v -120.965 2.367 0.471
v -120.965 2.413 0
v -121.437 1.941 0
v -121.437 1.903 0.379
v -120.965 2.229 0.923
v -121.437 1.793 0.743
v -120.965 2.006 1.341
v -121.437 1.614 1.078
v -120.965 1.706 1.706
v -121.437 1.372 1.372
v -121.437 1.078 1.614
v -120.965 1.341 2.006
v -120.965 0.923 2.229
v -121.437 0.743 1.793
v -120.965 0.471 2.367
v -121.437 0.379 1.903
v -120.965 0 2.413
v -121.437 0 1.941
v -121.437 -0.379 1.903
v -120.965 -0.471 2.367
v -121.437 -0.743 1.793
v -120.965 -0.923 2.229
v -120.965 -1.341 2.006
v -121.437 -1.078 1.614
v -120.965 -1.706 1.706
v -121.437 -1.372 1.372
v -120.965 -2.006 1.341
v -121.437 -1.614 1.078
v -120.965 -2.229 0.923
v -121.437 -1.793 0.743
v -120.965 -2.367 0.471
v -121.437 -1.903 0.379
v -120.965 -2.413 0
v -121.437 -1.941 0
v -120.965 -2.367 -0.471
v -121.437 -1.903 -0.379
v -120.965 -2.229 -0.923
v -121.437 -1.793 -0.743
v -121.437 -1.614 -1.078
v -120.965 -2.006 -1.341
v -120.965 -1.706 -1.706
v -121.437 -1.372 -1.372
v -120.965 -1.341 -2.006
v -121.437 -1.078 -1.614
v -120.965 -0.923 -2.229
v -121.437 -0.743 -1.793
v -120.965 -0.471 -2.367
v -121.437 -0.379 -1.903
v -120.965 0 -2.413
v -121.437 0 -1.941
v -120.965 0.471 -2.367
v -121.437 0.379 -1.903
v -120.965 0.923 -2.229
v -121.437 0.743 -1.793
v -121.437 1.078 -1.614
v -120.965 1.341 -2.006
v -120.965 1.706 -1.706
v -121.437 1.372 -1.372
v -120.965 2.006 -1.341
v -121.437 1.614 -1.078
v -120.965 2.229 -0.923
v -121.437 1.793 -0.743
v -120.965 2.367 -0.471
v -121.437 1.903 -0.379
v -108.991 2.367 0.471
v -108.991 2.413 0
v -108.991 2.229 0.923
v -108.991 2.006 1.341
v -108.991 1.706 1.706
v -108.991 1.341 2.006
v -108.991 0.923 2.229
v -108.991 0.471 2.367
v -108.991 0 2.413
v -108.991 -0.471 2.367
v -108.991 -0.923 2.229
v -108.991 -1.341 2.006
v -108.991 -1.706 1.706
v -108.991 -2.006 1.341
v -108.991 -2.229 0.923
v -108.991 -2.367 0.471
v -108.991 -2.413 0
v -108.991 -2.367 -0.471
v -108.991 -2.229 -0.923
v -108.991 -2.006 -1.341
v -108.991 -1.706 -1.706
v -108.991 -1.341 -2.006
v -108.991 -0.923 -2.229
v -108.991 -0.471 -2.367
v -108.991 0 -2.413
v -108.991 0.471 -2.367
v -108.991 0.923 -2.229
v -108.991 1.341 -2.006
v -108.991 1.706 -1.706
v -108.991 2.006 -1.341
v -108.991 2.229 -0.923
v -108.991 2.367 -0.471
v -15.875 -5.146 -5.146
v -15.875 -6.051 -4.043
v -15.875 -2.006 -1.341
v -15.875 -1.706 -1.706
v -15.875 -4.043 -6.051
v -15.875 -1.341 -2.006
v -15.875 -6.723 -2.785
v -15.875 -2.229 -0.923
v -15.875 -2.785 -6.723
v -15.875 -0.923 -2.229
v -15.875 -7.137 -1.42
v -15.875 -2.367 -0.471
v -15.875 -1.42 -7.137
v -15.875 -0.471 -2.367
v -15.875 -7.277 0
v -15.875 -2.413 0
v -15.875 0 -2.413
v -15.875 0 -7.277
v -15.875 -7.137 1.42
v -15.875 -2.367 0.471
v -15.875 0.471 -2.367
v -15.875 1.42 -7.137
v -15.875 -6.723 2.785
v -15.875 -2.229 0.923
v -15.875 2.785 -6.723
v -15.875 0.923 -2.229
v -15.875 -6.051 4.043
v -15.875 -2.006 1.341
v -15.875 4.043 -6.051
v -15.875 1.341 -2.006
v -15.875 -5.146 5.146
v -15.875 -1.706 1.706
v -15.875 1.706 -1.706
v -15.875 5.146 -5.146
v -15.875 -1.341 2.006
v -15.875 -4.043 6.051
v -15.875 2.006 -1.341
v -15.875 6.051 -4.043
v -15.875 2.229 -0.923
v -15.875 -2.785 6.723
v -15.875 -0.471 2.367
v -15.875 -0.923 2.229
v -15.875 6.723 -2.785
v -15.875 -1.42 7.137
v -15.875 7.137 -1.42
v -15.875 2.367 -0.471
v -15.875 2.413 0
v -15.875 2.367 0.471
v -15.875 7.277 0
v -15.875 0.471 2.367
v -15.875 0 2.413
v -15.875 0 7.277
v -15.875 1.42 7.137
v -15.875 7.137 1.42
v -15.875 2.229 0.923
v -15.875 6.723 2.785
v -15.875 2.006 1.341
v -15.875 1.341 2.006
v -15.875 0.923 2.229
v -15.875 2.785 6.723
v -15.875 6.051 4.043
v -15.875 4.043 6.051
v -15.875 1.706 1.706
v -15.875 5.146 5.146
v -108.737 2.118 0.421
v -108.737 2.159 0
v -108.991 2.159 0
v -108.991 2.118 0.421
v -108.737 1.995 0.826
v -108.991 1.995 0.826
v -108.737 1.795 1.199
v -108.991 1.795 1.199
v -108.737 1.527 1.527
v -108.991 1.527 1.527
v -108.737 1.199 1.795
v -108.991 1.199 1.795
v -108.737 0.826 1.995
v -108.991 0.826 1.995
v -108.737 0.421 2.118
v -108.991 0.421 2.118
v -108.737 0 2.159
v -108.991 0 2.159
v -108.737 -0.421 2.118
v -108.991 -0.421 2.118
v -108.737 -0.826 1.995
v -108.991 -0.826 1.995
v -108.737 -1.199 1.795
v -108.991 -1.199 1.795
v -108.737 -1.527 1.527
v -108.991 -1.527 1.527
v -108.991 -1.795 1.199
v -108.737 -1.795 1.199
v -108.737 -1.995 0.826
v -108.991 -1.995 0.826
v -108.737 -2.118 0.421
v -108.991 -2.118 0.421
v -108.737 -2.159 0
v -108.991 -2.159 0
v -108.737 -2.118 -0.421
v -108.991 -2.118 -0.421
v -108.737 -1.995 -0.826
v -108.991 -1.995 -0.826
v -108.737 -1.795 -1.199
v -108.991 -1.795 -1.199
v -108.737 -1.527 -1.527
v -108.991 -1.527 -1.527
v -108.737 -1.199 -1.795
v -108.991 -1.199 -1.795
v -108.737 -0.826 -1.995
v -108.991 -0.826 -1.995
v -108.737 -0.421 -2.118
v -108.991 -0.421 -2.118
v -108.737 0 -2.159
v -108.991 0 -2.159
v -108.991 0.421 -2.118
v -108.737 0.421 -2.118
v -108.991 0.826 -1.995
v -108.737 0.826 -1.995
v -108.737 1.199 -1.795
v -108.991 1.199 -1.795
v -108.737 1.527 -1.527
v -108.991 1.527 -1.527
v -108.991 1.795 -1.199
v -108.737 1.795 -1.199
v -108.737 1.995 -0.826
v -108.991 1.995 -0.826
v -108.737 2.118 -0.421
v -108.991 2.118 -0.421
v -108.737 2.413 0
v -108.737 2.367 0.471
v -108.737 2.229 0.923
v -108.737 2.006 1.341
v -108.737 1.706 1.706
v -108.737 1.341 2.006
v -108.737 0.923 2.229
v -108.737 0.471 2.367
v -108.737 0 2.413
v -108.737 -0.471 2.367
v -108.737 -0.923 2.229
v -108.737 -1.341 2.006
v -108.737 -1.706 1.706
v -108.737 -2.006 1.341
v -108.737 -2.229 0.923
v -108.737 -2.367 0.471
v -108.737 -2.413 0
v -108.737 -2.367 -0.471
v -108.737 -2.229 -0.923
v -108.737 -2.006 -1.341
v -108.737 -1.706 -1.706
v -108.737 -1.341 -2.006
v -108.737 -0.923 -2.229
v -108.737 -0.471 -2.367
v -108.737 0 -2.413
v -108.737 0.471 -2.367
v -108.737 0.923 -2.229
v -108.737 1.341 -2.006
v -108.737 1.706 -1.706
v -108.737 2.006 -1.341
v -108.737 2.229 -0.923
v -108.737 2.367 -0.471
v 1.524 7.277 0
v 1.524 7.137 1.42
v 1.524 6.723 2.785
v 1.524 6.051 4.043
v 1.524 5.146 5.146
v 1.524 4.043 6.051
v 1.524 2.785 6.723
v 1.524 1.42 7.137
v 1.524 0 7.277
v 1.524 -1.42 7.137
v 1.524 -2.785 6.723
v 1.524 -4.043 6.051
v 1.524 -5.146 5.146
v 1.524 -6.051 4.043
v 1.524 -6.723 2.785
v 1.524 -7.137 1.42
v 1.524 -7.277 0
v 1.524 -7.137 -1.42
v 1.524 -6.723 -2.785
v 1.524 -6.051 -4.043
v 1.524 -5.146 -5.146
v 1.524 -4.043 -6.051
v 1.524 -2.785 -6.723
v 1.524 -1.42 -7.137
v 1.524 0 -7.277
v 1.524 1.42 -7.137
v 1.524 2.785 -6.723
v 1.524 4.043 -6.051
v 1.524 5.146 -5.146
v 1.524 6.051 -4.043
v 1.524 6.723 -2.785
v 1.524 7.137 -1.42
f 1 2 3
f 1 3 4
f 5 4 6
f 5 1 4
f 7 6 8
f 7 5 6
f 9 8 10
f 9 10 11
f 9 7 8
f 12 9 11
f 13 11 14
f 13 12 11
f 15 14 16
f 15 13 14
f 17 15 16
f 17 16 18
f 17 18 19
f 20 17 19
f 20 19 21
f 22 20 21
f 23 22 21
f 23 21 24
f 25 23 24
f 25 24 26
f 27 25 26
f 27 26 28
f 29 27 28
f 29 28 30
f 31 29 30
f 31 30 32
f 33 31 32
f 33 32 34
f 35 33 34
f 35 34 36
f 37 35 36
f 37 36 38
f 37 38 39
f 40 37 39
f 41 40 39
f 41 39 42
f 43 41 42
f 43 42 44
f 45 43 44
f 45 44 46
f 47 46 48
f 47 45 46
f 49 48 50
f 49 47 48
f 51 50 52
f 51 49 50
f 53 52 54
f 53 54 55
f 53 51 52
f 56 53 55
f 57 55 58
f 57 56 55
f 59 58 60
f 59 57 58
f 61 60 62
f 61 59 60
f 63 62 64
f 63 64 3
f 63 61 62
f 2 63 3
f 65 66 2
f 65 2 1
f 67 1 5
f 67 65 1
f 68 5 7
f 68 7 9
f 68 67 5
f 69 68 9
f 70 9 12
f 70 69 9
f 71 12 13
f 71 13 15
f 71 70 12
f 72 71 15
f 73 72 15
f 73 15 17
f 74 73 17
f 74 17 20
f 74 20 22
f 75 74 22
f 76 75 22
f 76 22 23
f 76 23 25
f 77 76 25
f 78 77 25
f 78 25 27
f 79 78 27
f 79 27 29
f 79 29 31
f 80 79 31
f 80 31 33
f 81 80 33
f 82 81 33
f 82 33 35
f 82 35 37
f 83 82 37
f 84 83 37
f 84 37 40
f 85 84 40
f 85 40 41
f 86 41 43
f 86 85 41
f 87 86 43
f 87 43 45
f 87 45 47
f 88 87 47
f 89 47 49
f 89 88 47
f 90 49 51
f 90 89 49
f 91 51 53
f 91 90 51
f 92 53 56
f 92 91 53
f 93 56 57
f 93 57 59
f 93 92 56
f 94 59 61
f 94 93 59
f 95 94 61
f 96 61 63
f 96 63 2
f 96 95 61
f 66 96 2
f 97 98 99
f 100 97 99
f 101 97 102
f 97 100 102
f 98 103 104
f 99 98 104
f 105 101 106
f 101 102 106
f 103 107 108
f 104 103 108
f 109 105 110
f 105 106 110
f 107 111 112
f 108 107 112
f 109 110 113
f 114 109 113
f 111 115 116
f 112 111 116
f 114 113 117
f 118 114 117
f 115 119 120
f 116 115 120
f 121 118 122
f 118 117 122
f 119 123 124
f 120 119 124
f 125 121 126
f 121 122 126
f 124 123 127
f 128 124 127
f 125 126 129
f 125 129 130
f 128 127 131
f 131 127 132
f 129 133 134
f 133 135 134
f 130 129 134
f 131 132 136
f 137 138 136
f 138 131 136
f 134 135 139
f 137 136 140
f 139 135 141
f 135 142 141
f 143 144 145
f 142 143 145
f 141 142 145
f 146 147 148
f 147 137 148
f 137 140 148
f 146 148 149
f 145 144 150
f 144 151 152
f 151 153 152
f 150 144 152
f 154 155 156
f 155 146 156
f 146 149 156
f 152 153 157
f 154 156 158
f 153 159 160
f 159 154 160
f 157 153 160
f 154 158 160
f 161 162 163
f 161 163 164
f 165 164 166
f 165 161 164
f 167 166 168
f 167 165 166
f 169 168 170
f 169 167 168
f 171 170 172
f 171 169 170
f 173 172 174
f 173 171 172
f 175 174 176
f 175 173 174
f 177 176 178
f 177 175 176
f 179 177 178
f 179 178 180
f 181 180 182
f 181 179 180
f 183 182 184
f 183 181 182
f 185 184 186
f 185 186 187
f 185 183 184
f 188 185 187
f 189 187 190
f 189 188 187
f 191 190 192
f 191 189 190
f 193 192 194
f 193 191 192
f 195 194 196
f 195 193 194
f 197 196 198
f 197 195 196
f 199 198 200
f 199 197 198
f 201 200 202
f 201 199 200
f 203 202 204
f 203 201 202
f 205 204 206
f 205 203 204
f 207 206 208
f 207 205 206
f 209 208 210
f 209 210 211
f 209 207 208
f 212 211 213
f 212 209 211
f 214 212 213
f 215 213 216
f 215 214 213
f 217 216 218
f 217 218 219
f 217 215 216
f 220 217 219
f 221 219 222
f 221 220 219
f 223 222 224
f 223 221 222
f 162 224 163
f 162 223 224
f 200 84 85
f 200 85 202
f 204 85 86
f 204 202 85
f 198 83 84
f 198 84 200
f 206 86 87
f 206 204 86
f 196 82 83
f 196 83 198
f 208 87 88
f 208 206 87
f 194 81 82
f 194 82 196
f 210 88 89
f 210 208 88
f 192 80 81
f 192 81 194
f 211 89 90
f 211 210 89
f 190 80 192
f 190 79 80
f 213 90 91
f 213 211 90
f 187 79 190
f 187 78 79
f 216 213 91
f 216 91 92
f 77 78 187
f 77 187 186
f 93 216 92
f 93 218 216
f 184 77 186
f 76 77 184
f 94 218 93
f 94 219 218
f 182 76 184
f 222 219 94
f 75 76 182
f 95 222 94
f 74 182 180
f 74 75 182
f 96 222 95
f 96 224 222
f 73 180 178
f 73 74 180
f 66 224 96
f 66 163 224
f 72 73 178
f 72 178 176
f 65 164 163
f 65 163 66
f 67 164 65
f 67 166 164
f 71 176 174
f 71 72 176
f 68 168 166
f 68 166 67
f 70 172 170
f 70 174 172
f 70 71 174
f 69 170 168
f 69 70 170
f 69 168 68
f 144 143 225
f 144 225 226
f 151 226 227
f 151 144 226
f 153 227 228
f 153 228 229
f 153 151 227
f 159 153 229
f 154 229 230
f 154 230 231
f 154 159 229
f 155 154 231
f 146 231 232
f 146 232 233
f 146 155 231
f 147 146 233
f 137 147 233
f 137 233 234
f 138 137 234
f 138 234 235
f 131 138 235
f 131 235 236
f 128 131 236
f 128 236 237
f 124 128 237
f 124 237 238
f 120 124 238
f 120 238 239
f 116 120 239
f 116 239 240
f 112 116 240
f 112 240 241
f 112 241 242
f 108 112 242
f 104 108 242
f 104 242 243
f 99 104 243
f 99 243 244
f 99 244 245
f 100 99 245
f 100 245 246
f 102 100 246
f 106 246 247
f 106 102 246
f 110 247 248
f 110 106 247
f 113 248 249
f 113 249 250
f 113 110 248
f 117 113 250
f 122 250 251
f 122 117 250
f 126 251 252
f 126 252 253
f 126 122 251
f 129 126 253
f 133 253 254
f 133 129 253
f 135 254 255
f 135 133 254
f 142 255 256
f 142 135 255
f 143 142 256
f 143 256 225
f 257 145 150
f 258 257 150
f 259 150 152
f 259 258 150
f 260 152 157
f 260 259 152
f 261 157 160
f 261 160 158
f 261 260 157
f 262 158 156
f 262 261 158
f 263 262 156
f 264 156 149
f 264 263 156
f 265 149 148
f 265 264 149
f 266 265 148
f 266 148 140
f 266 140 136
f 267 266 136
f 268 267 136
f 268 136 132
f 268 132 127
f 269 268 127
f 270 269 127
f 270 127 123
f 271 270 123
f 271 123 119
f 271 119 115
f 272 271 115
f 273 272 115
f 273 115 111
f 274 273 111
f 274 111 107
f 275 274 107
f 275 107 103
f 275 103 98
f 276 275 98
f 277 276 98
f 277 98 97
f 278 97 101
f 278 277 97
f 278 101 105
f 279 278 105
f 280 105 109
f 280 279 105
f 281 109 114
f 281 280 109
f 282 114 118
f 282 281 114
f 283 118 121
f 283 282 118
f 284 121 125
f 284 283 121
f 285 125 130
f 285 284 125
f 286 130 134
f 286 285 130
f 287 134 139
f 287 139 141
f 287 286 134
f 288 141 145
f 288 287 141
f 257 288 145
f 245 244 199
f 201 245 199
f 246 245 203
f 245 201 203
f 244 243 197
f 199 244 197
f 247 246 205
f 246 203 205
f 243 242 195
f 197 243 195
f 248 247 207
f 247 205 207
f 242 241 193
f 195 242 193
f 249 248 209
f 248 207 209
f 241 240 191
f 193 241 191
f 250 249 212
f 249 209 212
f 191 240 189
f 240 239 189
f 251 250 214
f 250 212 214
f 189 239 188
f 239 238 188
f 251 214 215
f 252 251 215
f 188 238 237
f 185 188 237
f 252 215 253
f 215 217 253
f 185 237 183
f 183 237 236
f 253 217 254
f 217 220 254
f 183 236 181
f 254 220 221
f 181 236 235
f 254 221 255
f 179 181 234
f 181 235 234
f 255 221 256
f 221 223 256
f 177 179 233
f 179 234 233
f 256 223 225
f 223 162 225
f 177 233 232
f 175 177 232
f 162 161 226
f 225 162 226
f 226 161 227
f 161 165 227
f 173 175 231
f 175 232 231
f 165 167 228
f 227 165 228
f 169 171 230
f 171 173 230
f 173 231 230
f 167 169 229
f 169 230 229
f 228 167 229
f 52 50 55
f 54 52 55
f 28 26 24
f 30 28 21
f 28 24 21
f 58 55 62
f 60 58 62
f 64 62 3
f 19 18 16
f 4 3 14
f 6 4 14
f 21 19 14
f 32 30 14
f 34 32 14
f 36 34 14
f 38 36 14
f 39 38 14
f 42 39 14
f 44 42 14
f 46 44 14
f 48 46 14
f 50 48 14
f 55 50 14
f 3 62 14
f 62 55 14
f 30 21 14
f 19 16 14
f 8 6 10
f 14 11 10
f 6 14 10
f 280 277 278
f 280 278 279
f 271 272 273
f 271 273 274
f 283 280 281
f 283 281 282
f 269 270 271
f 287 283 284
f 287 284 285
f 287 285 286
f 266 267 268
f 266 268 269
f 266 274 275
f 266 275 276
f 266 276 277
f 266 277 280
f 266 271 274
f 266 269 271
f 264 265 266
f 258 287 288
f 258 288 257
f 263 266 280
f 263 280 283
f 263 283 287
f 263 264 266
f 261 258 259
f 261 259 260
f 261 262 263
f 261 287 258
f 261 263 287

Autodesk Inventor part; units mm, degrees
sketch "Sketch_3" plane through (0, 0, 0) normal (0, 0, 1) x (1, 0, 0)
  line L0 (0, 0) -> (-121.4374, 0)
  line L1 (-121.4374, 0) -> (-121.4374, 1.9406)
  line L2 (-121.4374, 1.9406) -> (-120.965, 2.413)
  line L3 (-120.965, 2.413) -> (0, 2.413)
  line L4 (0, 2.413) -> (0, 0)
  line L5 (0, 0) -> (-121.4374, 0)
revolve "Revolution1" add sketch "Sketch_3" angle 360 about axis through (0, 0, 0) along (1, 0, 0)
thread "Thread1" size "10-32 UNF" class "2A" standard "ANSI Unified Screw Threads" length 12.446 offset 108.9914
sketch "Sketch_17" plane through (0, 0, 0) normal (0, 0, 1) x (1, 0, 0)
  line L0 (121.4374, 0) -> (-121.4374, 0)
  line L1 (-108.9914, 2.413) -> (-108.9914, 2.159)
  line L2 (-108.9914, 2.159) -> (-108.7374, 2.159)
  line L3 (-108.7374, 2.159) -> (-108.7374, 2.413)
  line L4 (-108.7374, 2.413) -> (-108.9914, 2.413)
revolve "Revolution2" cut sketch "Sketch_17" angle 360 about axis through (121.4374, 0, 0) along (1, 0, 0)
sketch "Sketch_12" plane through (0, 0, 0) normal (0, 0, 1) x (1, 0, 0)
  line L0 (1.524, 0) -> (-15.875, 0)
  line L1 (-15.875, 0) -> (-15.875, 7.2771)
  line L2 (-15.875, 7.2771) -> (1.524, 7.2771)
  line L3 (1.524, 7.2771) -> (1.524, 0)
  line L4 (1.524, 0) -> (-15.875, 0)
revolve "Revolution3" add sketch "Sketch_12" angle 360 about axis through (1.524, 0, 0) along (1, 0, 0)
ref_plane "h1_XY" through (-121.4374, 0, 0) normal (0, 1, 0) x (1, 0, 0)
ref_plane "h1_YZ" through (-121.4374, 0, 0) normal (1, 0, 0) x (0, 0, -1)
ref_plane "h1_ZX" through (-121.4374, 0, 0) normal (0, 0, -1) x (0, 1, 0)
ref_plane "h2_XY" through (-108.7374, 0, 0) normal (0, 1, 0) x (1, 0, 0)
ref_plane "h2_YZ" through (-108.7374, 0, 0) normal (1, 0, 0) x (0, 0, -1)
ref_plane "h2_ZX" through (-108.7374, 0, 0) normal (0, 0, -1) x (0, 1, 0)
ref_plane "k1_XY" through (-121.4374, 0, -2.413) normal (0, 1, 0) x (1, 0, 0)
ref_plane "k1_YZ" through (-121.4374, 0, -2.413) normal (1, 0, 0) x (0, 0, -1)
ref_plane "k1_ZX" through (-121.4374, 0, -2.413) normal (0, 0, -1) x (0, 1, 0)
ref_plane "k2_XY" through (-121.4374, 0, 2.413) normal (0, 1, 0) x (1, 0, 0)
ref_plane "k2_YZ" through (-121.4374, 0, 2.413) normal (1, 0, 0) x (0, 0, -1)
ref_plane "k2_ZX" through (-121.4374, 0, 2.413) normal (0, 0, -1) x (0, 1, 0)
ref_plane "start_XY" through (-108.7374, 0, 0) normal (0, 1, 0) x (1, 0, 0)
ref_plane "start_YZ" through (-108.7374, 0, 0) normal (1, 0, 0) x (0, 0, -1)
ref_plane "start_ZX" through (-108.7374, 0, 0) normal (0, 0, -1) x (0, 1, 0)
ref_plane "to_prc_XY" through (-108.7374, 0, 0) normal (1, 0, 0) x (0, 0, -1)
ref_plane "to_prc_YZ" through (-108.7374, 0, 0) normal (0, 0, -1) x (0, 1, 0)
ref_plane "to_prc_ZX" through (-108.7374, 0, 0) normal (0, 1, 0) x (1, 0, 0)
ref_plane "to_rod_guide_XY" through (-121.4374, 0, 0) normal (1, 0, 0) x (0, 0, -1)
ref_plane "to_rod_guide_YZ" through (-121.4374, 0, 0) normal (0, 0, -1) x (0, 1, 0)
ref_plane "to_rod_guide_ZX" through (-121.4374, 0, 0) normal (0, 1, 0) x (1, 0, 0)
properties part number "D-75080.5-2XP-4.781-3pos"
